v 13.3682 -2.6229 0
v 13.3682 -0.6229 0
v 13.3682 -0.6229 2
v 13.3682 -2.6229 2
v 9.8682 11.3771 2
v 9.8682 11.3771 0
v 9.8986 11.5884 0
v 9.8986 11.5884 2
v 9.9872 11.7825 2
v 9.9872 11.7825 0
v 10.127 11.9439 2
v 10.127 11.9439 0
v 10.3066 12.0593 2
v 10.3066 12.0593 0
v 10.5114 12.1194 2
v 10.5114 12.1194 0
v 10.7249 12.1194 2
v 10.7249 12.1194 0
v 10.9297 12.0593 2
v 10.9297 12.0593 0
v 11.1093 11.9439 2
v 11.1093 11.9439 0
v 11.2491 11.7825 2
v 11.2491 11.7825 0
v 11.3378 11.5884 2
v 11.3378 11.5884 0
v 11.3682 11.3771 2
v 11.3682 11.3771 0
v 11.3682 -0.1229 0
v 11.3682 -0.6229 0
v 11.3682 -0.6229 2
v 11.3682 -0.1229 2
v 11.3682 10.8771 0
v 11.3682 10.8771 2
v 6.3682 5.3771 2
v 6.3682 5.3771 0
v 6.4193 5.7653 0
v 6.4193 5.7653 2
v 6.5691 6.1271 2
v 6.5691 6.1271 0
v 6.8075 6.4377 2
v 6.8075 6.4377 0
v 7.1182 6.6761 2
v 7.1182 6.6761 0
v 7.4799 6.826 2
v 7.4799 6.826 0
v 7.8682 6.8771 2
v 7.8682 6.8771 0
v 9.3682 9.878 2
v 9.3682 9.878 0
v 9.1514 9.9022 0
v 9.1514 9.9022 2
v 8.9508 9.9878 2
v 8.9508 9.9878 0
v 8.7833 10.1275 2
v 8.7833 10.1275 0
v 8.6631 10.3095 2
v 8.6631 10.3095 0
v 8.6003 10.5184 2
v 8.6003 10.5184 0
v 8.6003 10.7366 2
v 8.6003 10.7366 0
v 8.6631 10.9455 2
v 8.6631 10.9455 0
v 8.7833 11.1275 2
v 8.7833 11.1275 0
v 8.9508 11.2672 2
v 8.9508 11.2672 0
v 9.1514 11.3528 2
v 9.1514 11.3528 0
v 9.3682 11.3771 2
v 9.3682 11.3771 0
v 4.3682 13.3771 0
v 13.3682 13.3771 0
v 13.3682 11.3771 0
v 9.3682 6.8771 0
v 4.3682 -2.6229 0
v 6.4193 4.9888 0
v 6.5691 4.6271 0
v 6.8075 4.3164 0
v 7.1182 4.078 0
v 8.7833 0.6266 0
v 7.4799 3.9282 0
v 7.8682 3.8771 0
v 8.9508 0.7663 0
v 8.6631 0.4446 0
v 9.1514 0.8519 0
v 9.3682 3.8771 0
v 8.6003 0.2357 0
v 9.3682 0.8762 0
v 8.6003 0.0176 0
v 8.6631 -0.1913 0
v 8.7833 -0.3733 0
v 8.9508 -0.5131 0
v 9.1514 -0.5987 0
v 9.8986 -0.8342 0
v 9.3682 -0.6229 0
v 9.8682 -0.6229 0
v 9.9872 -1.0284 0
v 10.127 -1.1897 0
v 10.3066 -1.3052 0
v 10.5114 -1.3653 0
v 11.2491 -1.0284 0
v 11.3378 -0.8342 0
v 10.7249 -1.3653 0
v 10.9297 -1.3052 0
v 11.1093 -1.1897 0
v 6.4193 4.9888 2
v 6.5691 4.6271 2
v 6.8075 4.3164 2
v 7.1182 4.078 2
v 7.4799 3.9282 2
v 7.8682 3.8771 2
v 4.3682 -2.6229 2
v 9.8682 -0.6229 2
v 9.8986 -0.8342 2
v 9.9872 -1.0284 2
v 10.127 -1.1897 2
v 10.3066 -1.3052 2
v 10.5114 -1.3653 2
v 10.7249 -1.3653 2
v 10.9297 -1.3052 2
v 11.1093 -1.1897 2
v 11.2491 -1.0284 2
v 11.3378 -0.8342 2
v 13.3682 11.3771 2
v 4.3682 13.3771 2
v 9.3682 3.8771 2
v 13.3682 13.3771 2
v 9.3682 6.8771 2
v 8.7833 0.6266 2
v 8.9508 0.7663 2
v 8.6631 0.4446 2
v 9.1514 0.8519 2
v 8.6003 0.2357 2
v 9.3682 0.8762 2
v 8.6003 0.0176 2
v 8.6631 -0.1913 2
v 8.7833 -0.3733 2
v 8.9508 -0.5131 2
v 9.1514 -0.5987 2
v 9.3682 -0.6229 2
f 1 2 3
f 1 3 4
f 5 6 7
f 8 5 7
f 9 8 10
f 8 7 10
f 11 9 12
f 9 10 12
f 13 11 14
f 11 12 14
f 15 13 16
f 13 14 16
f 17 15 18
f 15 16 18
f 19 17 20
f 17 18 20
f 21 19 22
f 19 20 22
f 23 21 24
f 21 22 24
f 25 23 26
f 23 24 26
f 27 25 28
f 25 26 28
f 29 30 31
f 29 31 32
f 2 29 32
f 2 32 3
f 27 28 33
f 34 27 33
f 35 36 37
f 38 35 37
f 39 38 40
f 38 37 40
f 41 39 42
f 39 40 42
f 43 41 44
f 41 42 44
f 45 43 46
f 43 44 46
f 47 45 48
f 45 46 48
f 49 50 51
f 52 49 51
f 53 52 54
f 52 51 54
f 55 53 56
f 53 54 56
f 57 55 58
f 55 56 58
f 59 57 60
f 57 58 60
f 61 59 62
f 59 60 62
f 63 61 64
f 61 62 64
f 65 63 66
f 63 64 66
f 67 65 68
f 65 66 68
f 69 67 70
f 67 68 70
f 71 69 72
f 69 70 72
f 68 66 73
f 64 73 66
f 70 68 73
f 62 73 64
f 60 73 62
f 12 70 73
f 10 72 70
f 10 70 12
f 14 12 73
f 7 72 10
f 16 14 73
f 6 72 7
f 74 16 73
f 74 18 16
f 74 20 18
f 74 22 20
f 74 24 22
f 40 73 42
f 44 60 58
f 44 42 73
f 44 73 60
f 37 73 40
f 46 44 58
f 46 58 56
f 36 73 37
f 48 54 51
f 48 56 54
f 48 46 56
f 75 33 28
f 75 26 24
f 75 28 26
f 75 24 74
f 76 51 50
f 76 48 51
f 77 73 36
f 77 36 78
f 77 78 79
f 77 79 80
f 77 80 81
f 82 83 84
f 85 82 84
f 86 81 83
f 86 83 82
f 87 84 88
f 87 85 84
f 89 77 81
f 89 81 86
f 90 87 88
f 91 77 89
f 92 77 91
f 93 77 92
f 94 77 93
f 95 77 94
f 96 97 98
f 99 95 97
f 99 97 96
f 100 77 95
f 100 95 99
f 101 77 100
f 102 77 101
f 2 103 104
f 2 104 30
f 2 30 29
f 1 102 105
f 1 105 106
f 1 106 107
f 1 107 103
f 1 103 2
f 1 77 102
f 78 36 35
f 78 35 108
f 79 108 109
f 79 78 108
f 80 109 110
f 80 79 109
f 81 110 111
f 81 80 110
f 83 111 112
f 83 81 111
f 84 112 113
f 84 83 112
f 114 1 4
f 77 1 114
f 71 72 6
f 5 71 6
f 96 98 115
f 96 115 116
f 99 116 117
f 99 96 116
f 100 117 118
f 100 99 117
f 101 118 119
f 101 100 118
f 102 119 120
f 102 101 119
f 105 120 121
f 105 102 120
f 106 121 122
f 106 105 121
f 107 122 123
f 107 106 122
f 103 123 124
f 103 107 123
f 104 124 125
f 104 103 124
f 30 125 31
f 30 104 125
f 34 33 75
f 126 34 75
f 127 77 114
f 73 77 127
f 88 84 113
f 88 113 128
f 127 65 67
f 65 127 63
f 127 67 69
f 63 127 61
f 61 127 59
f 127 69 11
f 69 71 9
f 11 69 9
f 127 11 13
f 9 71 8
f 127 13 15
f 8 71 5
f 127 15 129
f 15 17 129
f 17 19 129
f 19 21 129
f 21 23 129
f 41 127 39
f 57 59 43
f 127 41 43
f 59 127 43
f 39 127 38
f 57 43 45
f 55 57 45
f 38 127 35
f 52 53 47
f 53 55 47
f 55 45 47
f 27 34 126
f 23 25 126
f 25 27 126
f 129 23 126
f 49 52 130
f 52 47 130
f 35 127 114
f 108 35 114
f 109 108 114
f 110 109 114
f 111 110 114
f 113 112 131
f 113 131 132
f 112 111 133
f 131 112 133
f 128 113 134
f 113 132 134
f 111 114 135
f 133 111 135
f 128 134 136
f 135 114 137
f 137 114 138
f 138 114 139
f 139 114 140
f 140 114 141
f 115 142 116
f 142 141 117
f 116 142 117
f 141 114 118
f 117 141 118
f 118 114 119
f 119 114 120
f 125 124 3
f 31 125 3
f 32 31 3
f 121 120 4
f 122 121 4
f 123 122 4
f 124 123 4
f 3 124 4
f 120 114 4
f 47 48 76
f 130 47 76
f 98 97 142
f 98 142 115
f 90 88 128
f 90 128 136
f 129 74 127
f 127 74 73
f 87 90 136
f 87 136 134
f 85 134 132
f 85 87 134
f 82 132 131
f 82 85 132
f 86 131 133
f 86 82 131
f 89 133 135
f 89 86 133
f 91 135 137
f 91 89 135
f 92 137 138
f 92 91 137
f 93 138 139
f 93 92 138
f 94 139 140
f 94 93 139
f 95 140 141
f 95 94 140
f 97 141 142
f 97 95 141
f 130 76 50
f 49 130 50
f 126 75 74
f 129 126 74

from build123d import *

# Parameters (mm, degrees)
BOSS_EXTRUDE1_DEPTH = 2


with BuildPart() as part:
    # Sketch1 → Boss-Extrude1 (new body)
    with BuildSketch(Plane.XY):
        with BuildLine():
            Line((13.368173221, 13.377065301), (4.368173221, 13.377065301))
            Line((4.368173221, 13.377065301), (4.368173221, 5.377065301))
            Line((4.368173221, 5.377065301), (6.368173221, 5.377065301))
            ThreePointArc((6.368173221, 5.377065301), (6.80751305, 6.437725473), (7.868173221, 6.877065301))
            Line((7.868173221, 6.877065301), (9.368173221, 6.877065301))
            Line((9.368173221, 6.877065301), (9.368173221, 9.877956548))
            ThreePointArc((9.368173221, 9.877956548), (8.59232295, 10.627510924), (9.368173221, 11.377065301))
            Line((9.368173221, 11.377065301), (9.868173221, 11.377065301))
            ThreePointArc((9.868173221, 11.377065301), (10.618173221, 12.127065301), (11.368173221, 11.377065301))
            Line((11.368173221, 11.377065301), (11.368173221, 10.877065301))
            Line((11.368173221, 10.877065301), (13.368173221, 11.377065301))
            Line((13.368173221, 11.377065301), (13.368173221, 13.377065301))
        make_face()
    boss_extrude1 = extrude(amount=BOSS_EXTRUDE1_DEPTH)

    # Mirror1: Boss-Extrude1 across plane
    add(boss_extrude1.mirror(Plane(origin=(6.368173221, 5.377065301, 2), x_dir=(0, 0, 1), z_dir=(0, 1, 0))))


solid = part.part
